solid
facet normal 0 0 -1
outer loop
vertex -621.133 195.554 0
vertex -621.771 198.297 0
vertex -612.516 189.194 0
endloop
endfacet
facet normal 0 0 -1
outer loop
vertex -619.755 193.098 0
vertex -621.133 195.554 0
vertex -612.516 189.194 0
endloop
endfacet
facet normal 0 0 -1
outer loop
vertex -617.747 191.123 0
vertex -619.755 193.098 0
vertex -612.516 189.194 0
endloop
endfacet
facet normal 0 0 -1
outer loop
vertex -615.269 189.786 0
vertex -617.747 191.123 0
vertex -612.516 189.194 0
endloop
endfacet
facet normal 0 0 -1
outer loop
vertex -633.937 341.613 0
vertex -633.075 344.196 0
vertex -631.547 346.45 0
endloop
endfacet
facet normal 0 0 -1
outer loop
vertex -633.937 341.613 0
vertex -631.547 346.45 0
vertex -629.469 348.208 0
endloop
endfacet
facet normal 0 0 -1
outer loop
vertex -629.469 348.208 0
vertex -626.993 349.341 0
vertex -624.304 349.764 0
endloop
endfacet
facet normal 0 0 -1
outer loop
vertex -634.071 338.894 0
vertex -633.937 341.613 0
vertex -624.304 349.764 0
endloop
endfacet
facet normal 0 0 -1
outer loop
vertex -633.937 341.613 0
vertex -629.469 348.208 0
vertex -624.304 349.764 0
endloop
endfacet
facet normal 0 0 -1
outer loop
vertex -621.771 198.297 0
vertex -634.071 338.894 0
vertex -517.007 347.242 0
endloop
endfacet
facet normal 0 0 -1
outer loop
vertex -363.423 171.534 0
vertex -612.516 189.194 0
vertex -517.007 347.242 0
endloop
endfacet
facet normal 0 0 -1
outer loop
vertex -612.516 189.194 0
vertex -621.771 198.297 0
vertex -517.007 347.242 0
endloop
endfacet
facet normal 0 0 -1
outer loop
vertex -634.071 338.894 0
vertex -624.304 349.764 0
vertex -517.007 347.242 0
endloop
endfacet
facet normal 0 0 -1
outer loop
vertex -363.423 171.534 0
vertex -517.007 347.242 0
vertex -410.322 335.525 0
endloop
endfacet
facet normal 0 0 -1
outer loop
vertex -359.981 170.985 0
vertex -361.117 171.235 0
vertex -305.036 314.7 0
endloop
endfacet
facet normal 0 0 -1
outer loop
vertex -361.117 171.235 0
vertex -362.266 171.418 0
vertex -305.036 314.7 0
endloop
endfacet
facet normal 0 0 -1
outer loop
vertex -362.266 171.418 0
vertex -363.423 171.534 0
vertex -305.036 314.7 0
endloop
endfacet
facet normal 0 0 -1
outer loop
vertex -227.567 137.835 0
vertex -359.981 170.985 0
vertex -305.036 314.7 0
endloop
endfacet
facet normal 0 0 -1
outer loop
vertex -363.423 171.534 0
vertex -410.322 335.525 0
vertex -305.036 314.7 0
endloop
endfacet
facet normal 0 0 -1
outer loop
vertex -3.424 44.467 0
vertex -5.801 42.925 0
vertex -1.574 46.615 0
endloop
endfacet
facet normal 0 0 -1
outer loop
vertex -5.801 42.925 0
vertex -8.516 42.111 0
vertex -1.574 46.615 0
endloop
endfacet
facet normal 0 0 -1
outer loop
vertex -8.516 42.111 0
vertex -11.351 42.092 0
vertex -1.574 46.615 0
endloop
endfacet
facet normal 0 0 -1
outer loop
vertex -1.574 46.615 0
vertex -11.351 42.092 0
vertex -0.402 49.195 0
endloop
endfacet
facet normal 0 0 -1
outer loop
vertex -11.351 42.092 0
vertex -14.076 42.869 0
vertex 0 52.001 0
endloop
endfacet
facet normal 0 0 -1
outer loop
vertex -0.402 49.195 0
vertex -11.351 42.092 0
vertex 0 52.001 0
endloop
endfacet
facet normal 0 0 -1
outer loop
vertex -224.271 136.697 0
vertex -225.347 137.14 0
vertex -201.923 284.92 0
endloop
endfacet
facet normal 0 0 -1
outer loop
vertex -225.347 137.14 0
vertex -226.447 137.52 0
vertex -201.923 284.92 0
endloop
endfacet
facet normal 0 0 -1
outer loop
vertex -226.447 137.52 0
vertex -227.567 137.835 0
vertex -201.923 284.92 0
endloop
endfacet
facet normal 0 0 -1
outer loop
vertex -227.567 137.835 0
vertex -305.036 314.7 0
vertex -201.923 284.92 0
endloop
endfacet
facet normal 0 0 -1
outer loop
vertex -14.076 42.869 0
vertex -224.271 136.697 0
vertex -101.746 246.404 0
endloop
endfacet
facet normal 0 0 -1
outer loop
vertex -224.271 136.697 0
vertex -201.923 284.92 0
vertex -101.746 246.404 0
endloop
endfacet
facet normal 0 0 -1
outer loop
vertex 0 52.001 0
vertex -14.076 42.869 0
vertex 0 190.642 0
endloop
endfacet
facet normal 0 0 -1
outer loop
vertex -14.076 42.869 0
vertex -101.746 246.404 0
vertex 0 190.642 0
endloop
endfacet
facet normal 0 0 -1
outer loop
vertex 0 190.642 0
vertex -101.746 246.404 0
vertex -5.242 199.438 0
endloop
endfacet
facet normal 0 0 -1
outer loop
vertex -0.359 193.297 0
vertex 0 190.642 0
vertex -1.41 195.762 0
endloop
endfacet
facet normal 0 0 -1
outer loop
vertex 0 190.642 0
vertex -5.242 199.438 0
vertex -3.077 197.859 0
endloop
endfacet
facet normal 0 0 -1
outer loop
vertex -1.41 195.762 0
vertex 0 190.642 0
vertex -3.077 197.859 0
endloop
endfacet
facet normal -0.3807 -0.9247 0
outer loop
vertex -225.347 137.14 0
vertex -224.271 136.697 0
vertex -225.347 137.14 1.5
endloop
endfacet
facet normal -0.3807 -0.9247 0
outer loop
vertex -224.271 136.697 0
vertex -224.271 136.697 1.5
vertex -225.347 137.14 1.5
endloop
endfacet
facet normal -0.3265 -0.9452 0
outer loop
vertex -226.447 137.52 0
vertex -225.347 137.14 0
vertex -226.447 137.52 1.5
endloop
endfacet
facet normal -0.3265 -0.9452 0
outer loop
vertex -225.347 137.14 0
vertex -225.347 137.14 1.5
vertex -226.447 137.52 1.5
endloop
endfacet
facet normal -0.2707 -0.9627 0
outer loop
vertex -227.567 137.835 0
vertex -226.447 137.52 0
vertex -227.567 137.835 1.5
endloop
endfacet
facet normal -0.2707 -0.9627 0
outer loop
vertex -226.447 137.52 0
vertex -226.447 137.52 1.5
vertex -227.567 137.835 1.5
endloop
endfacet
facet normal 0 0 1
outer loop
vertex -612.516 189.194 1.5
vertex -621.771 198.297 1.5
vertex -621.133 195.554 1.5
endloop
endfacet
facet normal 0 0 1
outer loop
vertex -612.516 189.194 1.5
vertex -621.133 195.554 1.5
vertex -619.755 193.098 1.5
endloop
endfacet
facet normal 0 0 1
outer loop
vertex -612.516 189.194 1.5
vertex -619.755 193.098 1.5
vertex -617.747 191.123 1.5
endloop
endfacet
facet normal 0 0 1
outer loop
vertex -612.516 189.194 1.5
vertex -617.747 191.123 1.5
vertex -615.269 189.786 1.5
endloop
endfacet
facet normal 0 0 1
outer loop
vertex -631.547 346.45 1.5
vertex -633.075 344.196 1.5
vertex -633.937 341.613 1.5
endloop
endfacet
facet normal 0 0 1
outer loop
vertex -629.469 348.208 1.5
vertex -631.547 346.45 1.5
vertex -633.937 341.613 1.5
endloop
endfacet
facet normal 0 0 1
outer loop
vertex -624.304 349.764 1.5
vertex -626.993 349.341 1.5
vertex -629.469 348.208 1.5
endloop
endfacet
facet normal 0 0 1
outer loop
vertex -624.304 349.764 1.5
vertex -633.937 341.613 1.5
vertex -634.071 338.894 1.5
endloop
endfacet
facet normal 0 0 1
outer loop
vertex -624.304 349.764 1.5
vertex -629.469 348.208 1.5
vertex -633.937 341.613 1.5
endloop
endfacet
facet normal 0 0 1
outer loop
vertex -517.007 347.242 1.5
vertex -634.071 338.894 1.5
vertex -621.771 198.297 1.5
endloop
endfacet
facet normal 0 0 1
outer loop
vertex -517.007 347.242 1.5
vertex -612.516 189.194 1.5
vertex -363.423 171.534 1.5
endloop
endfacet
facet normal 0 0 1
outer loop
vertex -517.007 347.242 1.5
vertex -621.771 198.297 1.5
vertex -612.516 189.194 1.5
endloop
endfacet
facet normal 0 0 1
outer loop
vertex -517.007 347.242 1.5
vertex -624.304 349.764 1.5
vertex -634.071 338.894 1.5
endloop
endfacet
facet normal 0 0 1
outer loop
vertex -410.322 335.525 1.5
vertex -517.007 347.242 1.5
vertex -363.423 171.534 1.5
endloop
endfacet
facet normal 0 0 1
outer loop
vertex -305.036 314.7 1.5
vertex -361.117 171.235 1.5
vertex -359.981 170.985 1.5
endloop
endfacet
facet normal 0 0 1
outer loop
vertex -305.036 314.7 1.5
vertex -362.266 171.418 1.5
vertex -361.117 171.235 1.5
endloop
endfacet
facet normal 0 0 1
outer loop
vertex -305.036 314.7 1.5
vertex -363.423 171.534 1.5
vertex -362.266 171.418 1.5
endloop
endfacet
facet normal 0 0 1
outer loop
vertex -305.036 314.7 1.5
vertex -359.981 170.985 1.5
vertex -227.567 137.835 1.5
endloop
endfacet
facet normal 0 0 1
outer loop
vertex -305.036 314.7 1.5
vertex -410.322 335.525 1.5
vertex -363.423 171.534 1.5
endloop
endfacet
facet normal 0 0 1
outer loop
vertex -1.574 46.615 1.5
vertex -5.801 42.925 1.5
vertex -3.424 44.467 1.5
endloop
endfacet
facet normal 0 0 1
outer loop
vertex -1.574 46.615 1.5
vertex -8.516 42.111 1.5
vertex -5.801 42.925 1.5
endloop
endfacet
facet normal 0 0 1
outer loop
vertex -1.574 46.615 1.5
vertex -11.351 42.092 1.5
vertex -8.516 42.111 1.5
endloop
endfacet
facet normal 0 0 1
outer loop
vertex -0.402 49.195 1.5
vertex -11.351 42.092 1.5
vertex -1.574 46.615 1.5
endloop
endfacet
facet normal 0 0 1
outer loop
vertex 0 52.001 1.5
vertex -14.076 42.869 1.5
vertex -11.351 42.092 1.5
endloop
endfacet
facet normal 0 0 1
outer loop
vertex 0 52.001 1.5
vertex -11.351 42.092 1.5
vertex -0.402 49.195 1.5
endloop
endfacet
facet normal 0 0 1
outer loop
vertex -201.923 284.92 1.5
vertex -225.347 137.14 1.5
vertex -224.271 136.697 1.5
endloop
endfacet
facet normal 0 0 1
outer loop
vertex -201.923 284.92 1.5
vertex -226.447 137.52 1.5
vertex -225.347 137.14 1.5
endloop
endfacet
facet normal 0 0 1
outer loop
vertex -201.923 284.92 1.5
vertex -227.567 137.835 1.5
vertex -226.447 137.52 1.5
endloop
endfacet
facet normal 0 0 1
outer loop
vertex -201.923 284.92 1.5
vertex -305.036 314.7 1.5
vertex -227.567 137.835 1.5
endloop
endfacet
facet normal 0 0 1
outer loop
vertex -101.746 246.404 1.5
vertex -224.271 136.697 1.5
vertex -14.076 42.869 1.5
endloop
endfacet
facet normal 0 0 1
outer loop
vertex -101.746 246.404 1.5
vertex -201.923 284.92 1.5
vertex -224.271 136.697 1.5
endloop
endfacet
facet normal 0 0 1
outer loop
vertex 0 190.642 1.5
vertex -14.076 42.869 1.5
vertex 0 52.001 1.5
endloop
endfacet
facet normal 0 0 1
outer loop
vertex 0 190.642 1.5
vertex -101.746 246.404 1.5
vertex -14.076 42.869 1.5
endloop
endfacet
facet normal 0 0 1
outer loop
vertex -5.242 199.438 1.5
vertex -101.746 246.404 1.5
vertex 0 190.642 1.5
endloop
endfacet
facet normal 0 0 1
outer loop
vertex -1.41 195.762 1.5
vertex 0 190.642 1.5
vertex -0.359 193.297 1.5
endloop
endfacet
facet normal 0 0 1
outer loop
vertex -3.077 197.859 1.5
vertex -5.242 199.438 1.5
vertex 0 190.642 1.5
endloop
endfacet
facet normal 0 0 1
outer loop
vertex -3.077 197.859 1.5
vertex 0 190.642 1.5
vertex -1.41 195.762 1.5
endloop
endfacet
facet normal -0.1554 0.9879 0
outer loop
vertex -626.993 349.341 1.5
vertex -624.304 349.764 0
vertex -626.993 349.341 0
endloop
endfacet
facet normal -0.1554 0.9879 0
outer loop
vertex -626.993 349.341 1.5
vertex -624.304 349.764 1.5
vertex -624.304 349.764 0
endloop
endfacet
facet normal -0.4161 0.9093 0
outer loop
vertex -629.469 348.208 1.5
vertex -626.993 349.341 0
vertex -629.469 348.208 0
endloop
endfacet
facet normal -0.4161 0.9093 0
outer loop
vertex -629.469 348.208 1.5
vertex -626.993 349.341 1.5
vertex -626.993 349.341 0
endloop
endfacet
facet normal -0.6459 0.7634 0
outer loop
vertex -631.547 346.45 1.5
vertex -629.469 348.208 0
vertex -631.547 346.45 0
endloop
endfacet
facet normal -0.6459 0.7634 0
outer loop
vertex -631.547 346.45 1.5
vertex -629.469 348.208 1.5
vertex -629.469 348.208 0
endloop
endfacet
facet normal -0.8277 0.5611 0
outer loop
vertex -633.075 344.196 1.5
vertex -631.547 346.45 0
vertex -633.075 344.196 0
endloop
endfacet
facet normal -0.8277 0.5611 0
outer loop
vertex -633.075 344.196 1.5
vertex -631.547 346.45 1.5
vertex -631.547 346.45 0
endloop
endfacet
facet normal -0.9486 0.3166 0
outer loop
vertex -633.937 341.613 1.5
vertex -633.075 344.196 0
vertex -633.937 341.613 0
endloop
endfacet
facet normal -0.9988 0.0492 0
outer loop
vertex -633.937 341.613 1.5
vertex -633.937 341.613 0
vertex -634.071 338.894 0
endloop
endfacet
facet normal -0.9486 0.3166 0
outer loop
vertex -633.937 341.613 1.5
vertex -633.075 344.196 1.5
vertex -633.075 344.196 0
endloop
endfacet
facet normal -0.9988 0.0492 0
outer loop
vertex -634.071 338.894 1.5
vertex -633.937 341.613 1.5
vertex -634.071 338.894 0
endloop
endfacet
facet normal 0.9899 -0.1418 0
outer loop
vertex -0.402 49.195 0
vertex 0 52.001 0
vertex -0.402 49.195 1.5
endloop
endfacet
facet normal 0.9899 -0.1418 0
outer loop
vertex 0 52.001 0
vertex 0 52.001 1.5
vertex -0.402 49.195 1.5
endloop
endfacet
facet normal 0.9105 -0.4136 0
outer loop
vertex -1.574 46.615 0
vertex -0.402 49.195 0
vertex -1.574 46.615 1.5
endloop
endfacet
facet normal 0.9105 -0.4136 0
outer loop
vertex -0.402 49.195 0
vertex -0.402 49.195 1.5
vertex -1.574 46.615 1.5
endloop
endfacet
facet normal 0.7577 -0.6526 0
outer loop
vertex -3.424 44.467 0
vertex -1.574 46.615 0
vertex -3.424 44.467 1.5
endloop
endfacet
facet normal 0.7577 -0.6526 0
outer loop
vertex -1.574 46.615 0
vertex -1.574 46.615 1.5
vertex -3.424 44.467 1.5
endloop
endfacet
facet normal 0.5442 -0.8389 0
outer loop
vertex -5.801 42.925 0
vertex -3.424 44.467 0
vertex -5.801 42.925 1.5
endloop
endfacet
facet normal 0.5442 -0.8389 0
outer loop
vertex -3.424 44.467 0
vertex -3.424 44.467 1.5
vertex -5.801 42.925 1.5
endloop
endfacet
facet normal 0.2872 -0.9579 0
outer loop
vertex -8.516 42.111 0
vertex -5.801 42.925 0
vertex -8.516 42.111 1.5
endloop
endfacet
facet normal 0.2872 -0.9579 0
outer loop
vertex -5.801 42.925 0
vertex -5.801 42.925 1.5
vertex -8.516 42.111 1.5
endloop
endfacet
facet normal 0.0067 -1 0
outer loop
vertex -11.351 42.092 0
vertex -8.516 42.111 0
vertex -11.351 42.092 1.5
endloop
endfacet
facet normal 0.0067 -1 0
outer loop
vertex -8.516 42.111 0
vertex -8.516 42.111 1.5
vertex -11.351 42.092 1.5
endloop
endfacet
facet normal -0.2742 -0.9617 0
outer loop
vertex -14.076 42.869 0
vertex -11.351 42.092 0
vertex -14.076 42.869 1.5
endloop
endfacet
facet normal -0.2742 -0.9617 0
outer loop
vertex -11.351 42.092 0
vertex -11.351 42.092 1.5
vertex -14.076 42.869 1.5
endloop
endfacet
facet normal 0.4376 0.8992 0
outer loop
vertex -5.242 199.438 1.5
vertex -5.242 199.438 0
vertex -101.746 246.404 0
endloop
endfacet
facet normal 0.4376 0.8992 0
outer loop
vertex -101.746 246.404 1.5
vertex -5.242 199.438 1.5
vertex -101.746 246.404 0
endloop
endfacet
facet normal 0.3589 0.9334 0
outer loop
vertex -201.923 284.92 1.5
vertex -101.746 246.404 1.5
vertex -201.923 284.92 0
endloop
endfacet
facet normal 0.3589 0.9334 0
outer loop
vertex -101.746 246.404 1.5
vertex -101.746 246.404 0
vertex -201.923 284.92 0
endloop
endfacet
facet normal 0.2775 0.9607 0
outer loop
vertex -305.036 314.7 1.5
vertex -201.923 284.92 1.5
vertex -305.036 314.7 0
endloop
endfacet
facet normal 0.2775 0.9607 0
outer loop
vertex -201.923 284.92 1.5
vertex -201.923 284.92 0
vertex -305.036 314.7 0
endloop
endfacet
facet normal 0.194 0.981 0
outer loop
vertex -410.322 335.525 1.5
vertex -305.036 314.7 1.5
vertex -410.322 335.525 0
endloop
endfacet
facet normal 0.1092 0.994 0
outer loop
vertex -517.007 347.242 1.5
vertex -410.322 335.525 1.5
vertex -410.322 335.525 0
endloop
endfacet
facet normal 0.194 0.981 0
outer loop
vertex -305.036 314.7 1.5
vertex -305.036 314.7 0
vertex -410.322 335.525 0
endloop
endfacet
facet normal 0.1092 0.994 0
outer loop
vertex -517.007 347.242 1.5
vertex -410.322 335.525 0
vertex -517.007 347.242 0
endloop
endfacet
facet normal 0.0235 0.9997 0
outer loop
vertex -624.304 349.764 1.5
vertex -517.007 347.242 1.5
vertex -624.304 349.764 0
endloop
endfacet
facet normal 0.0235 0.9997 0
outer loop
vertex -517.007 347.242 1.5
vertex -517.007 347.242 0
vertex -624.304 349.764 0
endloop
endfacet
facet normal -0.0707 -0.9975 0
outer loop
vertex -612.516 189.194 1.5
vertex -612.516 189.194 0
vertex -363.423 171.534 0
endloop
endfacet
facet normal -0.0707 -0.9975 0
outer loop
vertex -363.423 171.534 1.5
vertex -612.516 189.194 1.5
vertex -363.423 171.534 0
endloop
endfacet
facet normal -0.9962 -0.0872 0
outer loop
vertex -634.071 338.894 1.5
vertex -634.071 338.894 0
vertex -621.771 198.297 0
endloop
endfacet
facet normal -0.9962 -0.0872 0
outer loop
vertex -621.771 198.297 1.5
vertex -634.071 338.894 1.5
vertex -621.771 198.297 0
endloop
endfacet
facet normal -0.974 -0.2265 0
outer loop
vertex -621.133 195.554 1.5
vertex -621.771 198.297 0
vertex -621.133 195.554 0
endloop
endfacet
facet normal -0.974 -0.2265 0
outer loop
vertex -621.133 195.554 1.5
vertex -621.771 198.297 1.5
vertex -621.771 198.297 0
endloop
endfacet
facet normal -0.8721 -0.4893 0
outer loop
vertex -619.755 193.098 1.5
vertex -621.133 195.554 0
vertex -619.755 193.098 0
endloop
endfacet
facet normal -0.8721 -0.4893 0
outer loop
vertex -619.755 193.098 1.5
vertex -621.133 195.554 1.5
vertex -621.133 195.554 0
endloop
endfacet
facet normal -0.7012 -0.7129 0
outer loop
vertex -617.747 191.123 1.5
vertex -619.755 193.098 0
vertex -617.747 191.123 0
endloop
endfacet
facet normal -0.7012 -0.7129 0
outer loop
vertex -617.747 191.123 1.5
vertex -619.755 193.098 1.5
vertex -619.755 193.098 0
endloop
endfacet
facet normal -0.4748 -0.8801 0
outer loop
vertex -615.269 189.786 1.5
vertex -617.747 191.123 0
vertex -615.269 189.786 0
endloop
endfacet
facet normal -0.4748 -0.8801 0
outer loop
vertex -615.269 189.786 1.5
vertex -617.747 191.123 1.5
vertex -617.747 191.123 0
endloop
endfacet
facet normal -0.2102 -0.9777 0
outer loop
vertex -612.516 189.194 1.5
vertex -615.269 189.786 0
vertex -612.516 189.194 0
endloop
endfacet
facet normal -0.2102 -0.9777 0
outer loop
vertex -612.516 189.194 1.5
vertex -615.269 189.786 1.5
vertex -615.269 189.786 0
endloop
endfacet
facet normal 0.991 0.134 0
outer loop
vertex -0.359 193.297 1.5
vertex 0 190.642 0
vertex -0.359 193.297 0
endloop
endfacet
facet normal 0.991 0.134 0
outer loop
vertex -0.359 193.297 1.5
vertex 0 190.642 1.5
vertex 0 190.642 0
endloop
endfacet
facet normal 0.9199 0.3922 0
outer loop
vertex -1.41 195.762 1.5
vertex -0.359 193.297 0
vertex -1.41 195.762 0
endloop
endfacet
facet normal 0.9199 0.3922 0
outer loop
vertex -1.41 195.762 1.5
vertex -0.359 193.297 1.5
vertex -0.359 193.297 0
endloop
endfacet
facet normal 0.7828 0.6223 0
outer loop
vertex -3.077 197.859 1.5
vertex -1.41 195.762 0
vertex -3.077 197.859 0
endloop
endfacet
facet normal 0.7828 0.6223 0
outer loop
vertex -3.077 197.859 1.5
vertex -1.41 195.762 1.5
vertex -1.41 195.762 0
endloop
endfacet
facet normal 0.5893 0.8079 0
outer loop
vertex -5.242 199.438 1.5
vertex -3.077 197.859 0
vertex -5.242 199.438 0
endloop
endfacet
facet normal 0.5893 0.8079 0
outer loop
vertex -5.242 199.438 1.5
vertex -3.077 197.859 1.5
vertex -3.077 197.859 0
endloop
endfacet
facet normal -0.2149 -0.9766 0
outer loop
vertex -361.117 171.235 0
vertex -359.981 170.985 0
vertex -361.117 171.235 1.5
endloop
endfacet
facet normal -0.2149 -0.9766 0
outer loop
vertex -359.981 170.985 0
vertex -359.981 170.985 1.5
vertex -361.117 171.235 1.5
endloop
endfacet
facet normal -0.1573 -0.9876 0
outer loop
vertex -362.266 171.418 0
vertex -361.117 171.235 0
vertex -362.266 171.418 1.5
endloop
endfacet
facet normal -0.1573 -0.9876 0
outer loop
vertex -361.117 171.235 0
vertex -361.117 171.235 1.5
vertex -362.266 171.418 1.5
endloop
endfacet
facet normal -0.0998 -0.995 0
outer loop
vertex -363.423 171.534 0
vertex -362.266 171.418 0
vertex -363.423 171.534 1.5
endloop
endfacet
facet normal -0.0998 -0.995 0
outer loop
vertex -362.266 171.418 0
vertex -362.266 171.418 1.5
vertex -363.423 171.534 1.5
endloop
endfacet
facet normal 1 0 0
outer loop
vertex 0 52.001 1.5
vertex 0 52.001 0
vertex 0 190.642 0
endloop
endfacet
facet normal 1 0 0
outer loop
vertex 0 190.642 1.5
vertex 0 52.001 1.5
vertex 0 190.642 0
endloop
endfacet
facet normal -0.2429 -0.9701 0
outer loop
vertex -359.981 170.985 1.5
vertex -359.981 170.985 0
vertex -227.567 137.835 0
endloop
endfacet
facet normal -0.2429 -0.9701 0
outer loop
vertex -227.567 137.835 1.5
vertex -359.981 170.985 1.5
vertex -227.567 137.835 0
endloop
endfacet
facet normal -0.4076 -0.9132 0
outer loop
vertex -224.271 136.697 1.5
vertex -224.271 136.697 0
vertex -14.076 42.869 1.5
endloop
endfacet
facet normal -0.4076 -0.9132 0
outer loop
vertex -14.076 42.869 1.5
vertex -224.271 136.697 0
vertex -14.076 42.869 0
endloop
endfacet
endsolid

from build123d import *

# Parameters (mm, degrees)
F1_DEPTH = 1.5
F2_R     = 10
F3_R     = 20


with BuildPart() as f1:
    # F0 (on Top) → F1 (new body)
    with BuildSketch(Plane.XY):
        with BuildLine():
            Line((0, 36.5856099731), (0, 196.5856099731))
            ThreePointArc((0, 196.5856099731), (-307.3351576975, 315.2560594706), (-635, 349.5099039223))
            Line((-635, 349.5099039223), (-621.0269461922, 189.7971680702))
            Line((-621.0269461922, 189.7971680702), (-361.6779078132, 171.4103170113))
            Line((-361.6779078132, 171.4103170113), (-225.8692382849, 137.4102393502))
            Line((-225.8692382849, 137.4102393502), (0, 36.5856099731))
        make_face()
    extrude(amount=F1_DEPTH)

    # F2
    f2_edges = [f1.edges().sort_by_distance(p)[0] for p in [
        (0, 196.58561, 0.75),
        (-635, 349.509904, 0.75),
        (-621.026946, 189.797168, 0.75),
        (0, 36.58561, 0.75),
    ]]
    fillet(f2_edges, radius=F2_R)

    # F3
    f3_edges = [f1.edges().sort_by_distance(p)[0] for p in [
        (-361.677908, 171.410317, 0.75),
        (-225.869238, 137.410239, 0.75),
    ]]
    fillet(f3_edges, radius=F3_R)


solid = f1.part
